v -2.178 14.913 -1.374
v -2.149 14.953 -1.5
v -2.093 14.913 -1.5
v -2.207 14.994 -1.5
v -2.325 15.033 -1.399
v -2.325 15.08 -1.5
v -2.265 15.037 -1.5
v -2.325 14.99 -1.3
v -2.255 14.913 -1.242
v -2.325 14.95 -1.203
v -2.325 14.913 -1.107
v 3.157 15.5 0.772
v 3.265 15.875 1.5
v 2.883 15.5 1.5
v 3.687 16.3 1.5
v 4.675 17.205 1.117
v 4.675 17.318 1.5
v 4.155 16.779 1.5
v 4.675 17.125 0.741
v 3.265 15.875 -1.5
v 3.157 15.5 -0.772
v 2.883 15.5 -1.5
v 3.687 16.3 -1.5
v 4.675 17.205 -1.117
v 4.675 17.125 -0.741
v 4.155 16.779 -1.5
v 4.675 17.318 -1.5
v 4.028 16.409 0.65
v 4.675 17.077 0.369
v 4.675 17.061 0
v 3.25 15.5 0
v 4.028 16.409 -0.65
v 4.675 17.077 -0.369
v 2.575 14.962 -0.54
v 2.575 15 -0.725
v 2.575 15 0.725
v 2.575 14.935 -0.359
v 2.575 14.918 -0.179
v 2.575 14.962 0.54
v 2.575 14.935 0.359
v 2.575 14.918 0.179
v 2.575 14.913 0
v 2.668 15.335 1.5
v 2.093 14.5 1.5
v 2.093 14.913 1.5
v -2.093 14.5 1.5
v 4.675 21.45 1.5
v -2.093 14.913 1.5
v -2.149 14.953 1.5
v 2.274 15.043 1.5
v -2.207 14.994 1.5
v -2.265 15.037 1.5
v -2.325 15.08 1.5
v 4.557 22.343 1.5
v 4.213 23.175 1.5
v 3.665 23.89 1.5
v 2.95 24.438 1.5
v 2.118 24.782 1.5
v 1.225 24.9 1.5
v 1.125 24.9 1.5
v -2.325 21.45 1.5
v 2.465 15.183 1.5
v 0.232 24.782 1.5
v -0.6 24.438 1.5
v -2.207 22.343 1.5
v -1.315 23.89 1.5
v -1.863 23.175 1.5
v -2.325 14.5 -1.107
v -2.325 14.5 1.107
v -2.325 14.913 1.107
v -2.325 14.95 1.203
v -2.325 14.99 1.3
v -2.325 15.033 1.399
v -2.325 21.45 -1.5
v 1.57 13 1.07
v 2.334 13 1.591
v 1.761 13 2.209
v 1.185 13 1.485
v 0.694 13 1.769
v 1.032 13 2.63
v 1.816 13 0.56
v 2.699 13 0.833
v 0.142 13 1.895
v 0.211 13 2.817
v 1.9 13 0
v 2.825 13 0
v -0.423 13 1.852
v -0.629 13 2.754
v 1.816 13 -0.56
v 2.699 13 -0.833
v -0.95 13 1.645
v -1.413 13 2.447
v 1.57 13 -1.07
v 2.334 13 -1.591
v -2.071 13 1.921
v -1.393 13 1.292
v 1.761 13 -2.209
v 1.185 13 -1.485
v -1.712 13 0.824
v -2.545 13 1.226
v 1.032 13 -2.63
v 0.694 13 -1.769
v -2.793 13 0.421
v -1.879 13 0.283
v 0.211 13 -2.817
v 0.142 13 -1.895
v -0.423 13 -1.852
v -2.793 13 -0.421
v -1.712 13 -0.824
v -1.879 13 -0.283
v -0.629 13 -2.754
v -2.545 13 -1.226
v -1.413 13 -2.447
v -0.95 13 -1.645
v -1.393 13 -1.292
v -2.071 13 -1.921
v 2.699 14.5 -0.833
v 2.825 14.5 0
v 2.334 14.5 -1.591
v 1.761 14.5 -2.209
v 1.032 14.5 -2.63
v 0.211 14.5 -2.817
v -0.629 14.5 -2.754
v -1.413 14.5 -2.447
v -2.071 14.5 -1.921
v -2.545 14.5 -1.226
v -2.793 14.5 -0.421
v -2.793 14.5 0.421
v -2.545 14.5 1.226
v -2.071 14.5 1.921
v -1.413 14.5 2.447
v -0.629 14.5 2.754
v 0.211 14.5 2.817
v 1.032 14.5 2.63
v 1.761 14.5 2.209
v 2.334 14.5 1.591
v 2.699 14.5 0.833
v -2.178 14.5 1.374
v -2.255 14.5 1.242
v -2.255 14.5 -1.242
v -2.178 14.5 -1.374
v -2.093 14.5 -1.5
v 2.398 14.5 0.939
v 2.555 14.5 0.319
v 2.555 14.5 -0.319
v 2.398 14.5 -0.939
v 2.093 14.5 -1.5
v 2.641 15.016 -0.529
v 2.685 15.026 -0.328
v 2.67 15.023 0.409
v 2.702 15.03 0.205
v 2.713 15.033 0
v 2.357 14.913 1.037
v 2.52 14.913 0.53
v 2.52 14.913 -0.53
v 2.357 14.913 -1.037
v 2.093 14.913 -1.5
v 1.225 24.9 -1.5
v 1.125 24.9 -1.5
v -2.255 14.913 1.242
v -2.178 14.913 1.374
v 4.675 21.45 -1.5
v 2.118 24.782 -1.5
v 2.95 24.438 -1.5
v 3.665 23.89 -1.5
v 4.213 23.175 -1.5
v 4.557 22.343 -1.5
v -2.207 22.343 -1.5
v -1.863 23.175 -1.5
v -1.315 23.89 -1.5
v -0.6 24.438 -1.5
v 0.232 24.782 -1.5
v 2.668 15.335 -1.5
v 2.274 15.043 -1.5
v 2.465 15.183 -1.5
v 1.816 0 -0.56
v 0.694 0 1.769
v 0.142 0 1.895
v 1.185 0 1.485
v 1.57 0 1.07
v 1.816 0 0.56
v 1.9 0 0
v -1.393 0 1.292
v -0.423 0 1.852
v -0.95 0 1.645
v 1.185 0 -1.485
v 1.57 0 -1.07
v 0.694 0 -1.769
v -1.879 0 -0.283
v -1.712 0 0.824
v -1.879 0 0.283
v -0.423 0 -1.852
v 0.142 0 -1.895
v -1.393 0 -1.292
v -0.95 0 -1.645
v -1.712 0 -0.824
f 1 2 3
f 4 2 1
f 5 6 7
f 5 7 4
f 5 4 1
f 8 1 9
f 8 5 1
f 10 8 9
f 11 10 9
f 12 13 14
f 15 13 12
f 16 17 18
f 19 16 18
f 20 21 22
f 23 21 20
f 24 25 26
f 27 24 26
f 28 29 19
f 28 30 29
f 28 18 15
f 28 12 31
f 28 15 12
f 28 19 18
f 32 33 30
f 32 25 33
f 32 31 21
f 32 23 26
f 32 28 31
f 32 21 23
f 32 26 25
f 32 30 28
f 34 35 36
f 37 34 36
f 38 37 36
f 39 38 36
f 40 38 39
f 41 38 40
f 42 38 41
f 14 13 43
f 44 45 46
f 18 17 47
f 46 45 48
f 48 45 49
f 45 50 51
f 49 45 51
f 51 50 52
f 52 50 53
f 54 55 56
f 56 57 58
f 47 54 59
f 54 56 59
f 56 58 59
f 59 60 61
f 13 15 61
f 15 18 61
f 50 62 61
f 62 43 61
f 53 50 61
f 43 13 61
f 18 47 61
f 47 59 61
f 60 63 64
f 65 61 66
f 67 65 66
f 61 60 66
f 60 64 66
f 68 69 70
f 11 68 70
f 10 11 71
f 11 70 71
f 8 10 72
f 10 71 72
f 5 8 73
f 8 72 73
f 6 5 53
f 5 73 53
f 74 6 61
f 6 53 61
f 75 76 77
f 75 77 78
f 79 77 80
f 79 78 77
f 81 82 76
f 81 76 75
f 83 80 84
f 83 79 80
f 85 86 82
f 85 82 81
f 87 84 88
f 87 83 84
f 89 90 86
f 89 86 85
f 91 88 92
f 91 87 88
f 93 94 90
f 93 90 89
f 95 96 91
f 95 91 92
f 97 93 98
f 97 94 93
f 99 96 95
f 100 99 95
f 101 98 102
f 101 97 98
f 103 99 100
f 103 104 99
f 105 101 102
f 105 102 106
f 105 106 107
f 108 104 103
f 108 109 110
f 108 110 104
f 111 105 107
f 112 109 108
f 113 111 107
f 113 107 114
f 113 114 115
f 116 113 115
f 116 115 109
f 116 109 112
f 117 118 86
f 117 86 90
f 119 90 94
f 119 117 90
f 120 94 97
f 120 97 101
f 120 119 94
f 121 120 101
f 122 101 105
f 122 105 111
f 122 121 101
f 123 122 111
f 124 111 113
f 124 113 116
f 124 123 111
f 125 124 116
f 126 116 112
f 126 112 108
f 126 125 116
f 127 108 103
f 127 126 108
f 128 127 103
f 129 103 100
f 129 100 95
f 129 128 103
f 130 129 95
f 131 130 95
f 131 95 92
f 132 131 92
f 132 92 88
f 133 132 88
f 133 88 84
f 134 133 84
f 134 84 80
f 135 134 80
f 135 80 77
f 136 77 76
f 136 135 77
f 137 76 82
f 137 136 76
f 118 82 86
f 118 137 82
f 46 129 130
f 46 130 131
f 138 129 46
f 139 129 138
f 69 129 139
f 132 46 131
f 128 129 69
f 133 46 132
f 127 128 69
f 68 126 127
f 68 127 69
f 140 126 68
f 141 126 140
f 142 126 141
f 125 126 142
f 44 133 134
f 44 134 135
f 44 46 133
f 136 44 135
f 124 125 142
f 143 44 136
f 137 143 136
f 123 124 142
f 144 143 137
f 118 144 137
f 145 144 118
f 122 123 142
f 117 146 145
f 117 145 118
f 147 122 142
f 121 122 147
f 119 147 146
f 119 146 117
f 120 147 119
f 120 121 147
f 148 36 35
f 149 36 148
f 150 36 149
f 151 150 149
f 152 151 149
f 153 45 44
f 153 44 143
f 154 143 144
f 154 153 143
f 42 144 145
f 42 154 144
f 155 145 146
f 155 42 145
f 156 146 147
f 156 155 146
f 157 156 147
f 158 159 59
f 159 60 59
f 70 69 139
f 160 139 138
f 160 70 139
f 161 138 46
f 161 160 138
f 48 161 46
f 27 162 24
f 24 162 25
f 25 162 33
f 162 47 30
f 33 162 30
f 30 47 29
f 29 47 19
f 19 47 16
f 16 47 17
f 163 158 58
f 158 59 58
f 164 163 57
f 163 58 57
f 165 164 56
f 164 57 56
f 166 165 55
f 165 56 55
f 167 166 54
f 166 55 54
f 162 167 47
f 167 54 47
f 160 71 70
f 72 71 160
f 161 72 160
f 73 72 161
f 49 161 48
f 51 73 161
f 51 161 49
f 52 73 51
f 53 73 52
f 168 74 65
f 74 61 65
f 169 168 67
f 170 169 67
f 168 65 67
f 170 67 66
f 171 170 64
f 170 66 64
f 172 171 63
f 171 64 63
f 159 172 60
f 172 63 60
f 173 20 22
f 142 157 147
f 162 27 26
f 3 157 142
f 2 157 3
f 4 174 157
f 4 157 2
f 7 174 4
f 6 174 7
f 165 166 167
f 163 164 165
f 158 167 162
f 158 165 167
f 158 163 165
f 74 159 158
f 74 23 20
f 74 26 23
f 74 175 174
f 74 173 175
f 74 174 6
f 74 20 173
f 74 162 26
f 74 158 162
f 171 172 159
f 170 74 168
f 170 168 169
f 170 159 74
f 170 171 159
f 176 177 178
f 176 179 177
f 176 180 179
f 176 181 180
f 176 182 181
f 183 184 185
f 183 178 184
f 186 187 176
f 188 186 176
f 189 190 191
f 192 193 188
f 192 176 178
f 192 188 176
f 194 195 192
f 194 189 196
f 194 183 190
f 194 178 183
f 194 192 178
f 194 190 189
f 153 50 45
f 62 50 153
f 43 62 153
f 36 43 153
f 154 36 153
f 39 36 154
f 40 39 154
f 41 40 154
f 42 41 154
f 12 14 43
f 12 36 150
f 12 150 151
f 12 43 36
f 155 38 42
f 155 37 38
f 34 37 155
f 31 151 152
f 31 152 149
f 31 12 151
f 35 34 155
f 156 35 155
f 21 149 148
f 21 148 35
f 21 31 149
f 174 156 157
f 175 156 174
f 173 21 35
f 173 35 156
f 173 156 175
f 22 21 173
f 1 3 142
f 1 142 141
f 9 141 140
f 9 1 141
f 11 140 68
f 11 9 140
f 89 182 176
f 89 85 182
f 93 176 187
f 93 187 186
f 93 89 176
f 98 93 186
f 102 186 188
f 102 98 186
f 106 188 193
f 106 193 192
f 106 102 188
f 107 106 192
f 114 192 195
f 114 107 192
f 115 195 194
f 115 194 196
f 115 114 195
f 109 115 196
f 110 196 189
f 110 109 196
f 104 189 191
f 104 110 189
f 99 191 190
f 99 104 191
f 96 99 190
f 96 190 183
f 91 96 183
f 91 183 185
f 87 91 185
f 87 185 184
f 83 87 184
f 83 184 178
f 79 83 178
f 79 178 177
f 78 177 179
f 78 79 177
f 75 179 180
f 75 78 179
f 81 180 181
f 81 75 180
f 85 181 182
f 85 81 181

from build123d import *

# Parameters (mm, degrees)
BOSS_EXTRUDE1_DEPTH = 1.5


with BuildPart() as part:
    # Sketch1 → Revolve1 (revolve)
    with BuildSketch(Plane.XY):
        Polygon((0, 0), (1.9, 0), (1.9, 13), (2.825, 13), (2.825, 14.5), (0, 14.5), align=None)
    revolve(axis=Axis((0, 0, 0), (0, 1, 0)))

    # Sketch2 → Boss-Extrude1 (add, symmetric)
    with BuildSketch(Plane.XY):
        with BuildLine():
            Line((-2.325, 14.5), (-2.325, 21.45))
            ThreePointArc((-2.325, 21.45), (-1.314518395, 23.889518395), (1.125, 24.9))
            Line((1.125, 24.9), (1.225, 24.9))
            ThreePointArc((1.225, 24.9), (3.664518395, 23.889518395), (4.675, 21.45))
            Line((4.675, 21.45), (4.675, 15.5))
            Line((4.675, 15.5), (2.575, 15))
            Line((2.575, 15), (2.575, 14.5))
            Line((2.575, 14.5), (-2.325, 14.5))
        make_face()
    extrude(amount=BOSS_EXTRUDE1_DEPTH, both=True)

    # Sketch3 → DELETE CUT TO SEE REAL COMPONENT (revolve, cut)
    with BuildSketch(Plane.XY):
        Polygon((3.25, 15.5), (5.35, 17.8), (6.288787076, 17.8), (6.288787076, 14.5), (2.575, 14.5), (2.575, 14.913043478), align=None)
    revolve(axis=Axis((0, 0, 0), (0, 1, 0)), mode=Mode.SUBTRACT)


solid = part.part
